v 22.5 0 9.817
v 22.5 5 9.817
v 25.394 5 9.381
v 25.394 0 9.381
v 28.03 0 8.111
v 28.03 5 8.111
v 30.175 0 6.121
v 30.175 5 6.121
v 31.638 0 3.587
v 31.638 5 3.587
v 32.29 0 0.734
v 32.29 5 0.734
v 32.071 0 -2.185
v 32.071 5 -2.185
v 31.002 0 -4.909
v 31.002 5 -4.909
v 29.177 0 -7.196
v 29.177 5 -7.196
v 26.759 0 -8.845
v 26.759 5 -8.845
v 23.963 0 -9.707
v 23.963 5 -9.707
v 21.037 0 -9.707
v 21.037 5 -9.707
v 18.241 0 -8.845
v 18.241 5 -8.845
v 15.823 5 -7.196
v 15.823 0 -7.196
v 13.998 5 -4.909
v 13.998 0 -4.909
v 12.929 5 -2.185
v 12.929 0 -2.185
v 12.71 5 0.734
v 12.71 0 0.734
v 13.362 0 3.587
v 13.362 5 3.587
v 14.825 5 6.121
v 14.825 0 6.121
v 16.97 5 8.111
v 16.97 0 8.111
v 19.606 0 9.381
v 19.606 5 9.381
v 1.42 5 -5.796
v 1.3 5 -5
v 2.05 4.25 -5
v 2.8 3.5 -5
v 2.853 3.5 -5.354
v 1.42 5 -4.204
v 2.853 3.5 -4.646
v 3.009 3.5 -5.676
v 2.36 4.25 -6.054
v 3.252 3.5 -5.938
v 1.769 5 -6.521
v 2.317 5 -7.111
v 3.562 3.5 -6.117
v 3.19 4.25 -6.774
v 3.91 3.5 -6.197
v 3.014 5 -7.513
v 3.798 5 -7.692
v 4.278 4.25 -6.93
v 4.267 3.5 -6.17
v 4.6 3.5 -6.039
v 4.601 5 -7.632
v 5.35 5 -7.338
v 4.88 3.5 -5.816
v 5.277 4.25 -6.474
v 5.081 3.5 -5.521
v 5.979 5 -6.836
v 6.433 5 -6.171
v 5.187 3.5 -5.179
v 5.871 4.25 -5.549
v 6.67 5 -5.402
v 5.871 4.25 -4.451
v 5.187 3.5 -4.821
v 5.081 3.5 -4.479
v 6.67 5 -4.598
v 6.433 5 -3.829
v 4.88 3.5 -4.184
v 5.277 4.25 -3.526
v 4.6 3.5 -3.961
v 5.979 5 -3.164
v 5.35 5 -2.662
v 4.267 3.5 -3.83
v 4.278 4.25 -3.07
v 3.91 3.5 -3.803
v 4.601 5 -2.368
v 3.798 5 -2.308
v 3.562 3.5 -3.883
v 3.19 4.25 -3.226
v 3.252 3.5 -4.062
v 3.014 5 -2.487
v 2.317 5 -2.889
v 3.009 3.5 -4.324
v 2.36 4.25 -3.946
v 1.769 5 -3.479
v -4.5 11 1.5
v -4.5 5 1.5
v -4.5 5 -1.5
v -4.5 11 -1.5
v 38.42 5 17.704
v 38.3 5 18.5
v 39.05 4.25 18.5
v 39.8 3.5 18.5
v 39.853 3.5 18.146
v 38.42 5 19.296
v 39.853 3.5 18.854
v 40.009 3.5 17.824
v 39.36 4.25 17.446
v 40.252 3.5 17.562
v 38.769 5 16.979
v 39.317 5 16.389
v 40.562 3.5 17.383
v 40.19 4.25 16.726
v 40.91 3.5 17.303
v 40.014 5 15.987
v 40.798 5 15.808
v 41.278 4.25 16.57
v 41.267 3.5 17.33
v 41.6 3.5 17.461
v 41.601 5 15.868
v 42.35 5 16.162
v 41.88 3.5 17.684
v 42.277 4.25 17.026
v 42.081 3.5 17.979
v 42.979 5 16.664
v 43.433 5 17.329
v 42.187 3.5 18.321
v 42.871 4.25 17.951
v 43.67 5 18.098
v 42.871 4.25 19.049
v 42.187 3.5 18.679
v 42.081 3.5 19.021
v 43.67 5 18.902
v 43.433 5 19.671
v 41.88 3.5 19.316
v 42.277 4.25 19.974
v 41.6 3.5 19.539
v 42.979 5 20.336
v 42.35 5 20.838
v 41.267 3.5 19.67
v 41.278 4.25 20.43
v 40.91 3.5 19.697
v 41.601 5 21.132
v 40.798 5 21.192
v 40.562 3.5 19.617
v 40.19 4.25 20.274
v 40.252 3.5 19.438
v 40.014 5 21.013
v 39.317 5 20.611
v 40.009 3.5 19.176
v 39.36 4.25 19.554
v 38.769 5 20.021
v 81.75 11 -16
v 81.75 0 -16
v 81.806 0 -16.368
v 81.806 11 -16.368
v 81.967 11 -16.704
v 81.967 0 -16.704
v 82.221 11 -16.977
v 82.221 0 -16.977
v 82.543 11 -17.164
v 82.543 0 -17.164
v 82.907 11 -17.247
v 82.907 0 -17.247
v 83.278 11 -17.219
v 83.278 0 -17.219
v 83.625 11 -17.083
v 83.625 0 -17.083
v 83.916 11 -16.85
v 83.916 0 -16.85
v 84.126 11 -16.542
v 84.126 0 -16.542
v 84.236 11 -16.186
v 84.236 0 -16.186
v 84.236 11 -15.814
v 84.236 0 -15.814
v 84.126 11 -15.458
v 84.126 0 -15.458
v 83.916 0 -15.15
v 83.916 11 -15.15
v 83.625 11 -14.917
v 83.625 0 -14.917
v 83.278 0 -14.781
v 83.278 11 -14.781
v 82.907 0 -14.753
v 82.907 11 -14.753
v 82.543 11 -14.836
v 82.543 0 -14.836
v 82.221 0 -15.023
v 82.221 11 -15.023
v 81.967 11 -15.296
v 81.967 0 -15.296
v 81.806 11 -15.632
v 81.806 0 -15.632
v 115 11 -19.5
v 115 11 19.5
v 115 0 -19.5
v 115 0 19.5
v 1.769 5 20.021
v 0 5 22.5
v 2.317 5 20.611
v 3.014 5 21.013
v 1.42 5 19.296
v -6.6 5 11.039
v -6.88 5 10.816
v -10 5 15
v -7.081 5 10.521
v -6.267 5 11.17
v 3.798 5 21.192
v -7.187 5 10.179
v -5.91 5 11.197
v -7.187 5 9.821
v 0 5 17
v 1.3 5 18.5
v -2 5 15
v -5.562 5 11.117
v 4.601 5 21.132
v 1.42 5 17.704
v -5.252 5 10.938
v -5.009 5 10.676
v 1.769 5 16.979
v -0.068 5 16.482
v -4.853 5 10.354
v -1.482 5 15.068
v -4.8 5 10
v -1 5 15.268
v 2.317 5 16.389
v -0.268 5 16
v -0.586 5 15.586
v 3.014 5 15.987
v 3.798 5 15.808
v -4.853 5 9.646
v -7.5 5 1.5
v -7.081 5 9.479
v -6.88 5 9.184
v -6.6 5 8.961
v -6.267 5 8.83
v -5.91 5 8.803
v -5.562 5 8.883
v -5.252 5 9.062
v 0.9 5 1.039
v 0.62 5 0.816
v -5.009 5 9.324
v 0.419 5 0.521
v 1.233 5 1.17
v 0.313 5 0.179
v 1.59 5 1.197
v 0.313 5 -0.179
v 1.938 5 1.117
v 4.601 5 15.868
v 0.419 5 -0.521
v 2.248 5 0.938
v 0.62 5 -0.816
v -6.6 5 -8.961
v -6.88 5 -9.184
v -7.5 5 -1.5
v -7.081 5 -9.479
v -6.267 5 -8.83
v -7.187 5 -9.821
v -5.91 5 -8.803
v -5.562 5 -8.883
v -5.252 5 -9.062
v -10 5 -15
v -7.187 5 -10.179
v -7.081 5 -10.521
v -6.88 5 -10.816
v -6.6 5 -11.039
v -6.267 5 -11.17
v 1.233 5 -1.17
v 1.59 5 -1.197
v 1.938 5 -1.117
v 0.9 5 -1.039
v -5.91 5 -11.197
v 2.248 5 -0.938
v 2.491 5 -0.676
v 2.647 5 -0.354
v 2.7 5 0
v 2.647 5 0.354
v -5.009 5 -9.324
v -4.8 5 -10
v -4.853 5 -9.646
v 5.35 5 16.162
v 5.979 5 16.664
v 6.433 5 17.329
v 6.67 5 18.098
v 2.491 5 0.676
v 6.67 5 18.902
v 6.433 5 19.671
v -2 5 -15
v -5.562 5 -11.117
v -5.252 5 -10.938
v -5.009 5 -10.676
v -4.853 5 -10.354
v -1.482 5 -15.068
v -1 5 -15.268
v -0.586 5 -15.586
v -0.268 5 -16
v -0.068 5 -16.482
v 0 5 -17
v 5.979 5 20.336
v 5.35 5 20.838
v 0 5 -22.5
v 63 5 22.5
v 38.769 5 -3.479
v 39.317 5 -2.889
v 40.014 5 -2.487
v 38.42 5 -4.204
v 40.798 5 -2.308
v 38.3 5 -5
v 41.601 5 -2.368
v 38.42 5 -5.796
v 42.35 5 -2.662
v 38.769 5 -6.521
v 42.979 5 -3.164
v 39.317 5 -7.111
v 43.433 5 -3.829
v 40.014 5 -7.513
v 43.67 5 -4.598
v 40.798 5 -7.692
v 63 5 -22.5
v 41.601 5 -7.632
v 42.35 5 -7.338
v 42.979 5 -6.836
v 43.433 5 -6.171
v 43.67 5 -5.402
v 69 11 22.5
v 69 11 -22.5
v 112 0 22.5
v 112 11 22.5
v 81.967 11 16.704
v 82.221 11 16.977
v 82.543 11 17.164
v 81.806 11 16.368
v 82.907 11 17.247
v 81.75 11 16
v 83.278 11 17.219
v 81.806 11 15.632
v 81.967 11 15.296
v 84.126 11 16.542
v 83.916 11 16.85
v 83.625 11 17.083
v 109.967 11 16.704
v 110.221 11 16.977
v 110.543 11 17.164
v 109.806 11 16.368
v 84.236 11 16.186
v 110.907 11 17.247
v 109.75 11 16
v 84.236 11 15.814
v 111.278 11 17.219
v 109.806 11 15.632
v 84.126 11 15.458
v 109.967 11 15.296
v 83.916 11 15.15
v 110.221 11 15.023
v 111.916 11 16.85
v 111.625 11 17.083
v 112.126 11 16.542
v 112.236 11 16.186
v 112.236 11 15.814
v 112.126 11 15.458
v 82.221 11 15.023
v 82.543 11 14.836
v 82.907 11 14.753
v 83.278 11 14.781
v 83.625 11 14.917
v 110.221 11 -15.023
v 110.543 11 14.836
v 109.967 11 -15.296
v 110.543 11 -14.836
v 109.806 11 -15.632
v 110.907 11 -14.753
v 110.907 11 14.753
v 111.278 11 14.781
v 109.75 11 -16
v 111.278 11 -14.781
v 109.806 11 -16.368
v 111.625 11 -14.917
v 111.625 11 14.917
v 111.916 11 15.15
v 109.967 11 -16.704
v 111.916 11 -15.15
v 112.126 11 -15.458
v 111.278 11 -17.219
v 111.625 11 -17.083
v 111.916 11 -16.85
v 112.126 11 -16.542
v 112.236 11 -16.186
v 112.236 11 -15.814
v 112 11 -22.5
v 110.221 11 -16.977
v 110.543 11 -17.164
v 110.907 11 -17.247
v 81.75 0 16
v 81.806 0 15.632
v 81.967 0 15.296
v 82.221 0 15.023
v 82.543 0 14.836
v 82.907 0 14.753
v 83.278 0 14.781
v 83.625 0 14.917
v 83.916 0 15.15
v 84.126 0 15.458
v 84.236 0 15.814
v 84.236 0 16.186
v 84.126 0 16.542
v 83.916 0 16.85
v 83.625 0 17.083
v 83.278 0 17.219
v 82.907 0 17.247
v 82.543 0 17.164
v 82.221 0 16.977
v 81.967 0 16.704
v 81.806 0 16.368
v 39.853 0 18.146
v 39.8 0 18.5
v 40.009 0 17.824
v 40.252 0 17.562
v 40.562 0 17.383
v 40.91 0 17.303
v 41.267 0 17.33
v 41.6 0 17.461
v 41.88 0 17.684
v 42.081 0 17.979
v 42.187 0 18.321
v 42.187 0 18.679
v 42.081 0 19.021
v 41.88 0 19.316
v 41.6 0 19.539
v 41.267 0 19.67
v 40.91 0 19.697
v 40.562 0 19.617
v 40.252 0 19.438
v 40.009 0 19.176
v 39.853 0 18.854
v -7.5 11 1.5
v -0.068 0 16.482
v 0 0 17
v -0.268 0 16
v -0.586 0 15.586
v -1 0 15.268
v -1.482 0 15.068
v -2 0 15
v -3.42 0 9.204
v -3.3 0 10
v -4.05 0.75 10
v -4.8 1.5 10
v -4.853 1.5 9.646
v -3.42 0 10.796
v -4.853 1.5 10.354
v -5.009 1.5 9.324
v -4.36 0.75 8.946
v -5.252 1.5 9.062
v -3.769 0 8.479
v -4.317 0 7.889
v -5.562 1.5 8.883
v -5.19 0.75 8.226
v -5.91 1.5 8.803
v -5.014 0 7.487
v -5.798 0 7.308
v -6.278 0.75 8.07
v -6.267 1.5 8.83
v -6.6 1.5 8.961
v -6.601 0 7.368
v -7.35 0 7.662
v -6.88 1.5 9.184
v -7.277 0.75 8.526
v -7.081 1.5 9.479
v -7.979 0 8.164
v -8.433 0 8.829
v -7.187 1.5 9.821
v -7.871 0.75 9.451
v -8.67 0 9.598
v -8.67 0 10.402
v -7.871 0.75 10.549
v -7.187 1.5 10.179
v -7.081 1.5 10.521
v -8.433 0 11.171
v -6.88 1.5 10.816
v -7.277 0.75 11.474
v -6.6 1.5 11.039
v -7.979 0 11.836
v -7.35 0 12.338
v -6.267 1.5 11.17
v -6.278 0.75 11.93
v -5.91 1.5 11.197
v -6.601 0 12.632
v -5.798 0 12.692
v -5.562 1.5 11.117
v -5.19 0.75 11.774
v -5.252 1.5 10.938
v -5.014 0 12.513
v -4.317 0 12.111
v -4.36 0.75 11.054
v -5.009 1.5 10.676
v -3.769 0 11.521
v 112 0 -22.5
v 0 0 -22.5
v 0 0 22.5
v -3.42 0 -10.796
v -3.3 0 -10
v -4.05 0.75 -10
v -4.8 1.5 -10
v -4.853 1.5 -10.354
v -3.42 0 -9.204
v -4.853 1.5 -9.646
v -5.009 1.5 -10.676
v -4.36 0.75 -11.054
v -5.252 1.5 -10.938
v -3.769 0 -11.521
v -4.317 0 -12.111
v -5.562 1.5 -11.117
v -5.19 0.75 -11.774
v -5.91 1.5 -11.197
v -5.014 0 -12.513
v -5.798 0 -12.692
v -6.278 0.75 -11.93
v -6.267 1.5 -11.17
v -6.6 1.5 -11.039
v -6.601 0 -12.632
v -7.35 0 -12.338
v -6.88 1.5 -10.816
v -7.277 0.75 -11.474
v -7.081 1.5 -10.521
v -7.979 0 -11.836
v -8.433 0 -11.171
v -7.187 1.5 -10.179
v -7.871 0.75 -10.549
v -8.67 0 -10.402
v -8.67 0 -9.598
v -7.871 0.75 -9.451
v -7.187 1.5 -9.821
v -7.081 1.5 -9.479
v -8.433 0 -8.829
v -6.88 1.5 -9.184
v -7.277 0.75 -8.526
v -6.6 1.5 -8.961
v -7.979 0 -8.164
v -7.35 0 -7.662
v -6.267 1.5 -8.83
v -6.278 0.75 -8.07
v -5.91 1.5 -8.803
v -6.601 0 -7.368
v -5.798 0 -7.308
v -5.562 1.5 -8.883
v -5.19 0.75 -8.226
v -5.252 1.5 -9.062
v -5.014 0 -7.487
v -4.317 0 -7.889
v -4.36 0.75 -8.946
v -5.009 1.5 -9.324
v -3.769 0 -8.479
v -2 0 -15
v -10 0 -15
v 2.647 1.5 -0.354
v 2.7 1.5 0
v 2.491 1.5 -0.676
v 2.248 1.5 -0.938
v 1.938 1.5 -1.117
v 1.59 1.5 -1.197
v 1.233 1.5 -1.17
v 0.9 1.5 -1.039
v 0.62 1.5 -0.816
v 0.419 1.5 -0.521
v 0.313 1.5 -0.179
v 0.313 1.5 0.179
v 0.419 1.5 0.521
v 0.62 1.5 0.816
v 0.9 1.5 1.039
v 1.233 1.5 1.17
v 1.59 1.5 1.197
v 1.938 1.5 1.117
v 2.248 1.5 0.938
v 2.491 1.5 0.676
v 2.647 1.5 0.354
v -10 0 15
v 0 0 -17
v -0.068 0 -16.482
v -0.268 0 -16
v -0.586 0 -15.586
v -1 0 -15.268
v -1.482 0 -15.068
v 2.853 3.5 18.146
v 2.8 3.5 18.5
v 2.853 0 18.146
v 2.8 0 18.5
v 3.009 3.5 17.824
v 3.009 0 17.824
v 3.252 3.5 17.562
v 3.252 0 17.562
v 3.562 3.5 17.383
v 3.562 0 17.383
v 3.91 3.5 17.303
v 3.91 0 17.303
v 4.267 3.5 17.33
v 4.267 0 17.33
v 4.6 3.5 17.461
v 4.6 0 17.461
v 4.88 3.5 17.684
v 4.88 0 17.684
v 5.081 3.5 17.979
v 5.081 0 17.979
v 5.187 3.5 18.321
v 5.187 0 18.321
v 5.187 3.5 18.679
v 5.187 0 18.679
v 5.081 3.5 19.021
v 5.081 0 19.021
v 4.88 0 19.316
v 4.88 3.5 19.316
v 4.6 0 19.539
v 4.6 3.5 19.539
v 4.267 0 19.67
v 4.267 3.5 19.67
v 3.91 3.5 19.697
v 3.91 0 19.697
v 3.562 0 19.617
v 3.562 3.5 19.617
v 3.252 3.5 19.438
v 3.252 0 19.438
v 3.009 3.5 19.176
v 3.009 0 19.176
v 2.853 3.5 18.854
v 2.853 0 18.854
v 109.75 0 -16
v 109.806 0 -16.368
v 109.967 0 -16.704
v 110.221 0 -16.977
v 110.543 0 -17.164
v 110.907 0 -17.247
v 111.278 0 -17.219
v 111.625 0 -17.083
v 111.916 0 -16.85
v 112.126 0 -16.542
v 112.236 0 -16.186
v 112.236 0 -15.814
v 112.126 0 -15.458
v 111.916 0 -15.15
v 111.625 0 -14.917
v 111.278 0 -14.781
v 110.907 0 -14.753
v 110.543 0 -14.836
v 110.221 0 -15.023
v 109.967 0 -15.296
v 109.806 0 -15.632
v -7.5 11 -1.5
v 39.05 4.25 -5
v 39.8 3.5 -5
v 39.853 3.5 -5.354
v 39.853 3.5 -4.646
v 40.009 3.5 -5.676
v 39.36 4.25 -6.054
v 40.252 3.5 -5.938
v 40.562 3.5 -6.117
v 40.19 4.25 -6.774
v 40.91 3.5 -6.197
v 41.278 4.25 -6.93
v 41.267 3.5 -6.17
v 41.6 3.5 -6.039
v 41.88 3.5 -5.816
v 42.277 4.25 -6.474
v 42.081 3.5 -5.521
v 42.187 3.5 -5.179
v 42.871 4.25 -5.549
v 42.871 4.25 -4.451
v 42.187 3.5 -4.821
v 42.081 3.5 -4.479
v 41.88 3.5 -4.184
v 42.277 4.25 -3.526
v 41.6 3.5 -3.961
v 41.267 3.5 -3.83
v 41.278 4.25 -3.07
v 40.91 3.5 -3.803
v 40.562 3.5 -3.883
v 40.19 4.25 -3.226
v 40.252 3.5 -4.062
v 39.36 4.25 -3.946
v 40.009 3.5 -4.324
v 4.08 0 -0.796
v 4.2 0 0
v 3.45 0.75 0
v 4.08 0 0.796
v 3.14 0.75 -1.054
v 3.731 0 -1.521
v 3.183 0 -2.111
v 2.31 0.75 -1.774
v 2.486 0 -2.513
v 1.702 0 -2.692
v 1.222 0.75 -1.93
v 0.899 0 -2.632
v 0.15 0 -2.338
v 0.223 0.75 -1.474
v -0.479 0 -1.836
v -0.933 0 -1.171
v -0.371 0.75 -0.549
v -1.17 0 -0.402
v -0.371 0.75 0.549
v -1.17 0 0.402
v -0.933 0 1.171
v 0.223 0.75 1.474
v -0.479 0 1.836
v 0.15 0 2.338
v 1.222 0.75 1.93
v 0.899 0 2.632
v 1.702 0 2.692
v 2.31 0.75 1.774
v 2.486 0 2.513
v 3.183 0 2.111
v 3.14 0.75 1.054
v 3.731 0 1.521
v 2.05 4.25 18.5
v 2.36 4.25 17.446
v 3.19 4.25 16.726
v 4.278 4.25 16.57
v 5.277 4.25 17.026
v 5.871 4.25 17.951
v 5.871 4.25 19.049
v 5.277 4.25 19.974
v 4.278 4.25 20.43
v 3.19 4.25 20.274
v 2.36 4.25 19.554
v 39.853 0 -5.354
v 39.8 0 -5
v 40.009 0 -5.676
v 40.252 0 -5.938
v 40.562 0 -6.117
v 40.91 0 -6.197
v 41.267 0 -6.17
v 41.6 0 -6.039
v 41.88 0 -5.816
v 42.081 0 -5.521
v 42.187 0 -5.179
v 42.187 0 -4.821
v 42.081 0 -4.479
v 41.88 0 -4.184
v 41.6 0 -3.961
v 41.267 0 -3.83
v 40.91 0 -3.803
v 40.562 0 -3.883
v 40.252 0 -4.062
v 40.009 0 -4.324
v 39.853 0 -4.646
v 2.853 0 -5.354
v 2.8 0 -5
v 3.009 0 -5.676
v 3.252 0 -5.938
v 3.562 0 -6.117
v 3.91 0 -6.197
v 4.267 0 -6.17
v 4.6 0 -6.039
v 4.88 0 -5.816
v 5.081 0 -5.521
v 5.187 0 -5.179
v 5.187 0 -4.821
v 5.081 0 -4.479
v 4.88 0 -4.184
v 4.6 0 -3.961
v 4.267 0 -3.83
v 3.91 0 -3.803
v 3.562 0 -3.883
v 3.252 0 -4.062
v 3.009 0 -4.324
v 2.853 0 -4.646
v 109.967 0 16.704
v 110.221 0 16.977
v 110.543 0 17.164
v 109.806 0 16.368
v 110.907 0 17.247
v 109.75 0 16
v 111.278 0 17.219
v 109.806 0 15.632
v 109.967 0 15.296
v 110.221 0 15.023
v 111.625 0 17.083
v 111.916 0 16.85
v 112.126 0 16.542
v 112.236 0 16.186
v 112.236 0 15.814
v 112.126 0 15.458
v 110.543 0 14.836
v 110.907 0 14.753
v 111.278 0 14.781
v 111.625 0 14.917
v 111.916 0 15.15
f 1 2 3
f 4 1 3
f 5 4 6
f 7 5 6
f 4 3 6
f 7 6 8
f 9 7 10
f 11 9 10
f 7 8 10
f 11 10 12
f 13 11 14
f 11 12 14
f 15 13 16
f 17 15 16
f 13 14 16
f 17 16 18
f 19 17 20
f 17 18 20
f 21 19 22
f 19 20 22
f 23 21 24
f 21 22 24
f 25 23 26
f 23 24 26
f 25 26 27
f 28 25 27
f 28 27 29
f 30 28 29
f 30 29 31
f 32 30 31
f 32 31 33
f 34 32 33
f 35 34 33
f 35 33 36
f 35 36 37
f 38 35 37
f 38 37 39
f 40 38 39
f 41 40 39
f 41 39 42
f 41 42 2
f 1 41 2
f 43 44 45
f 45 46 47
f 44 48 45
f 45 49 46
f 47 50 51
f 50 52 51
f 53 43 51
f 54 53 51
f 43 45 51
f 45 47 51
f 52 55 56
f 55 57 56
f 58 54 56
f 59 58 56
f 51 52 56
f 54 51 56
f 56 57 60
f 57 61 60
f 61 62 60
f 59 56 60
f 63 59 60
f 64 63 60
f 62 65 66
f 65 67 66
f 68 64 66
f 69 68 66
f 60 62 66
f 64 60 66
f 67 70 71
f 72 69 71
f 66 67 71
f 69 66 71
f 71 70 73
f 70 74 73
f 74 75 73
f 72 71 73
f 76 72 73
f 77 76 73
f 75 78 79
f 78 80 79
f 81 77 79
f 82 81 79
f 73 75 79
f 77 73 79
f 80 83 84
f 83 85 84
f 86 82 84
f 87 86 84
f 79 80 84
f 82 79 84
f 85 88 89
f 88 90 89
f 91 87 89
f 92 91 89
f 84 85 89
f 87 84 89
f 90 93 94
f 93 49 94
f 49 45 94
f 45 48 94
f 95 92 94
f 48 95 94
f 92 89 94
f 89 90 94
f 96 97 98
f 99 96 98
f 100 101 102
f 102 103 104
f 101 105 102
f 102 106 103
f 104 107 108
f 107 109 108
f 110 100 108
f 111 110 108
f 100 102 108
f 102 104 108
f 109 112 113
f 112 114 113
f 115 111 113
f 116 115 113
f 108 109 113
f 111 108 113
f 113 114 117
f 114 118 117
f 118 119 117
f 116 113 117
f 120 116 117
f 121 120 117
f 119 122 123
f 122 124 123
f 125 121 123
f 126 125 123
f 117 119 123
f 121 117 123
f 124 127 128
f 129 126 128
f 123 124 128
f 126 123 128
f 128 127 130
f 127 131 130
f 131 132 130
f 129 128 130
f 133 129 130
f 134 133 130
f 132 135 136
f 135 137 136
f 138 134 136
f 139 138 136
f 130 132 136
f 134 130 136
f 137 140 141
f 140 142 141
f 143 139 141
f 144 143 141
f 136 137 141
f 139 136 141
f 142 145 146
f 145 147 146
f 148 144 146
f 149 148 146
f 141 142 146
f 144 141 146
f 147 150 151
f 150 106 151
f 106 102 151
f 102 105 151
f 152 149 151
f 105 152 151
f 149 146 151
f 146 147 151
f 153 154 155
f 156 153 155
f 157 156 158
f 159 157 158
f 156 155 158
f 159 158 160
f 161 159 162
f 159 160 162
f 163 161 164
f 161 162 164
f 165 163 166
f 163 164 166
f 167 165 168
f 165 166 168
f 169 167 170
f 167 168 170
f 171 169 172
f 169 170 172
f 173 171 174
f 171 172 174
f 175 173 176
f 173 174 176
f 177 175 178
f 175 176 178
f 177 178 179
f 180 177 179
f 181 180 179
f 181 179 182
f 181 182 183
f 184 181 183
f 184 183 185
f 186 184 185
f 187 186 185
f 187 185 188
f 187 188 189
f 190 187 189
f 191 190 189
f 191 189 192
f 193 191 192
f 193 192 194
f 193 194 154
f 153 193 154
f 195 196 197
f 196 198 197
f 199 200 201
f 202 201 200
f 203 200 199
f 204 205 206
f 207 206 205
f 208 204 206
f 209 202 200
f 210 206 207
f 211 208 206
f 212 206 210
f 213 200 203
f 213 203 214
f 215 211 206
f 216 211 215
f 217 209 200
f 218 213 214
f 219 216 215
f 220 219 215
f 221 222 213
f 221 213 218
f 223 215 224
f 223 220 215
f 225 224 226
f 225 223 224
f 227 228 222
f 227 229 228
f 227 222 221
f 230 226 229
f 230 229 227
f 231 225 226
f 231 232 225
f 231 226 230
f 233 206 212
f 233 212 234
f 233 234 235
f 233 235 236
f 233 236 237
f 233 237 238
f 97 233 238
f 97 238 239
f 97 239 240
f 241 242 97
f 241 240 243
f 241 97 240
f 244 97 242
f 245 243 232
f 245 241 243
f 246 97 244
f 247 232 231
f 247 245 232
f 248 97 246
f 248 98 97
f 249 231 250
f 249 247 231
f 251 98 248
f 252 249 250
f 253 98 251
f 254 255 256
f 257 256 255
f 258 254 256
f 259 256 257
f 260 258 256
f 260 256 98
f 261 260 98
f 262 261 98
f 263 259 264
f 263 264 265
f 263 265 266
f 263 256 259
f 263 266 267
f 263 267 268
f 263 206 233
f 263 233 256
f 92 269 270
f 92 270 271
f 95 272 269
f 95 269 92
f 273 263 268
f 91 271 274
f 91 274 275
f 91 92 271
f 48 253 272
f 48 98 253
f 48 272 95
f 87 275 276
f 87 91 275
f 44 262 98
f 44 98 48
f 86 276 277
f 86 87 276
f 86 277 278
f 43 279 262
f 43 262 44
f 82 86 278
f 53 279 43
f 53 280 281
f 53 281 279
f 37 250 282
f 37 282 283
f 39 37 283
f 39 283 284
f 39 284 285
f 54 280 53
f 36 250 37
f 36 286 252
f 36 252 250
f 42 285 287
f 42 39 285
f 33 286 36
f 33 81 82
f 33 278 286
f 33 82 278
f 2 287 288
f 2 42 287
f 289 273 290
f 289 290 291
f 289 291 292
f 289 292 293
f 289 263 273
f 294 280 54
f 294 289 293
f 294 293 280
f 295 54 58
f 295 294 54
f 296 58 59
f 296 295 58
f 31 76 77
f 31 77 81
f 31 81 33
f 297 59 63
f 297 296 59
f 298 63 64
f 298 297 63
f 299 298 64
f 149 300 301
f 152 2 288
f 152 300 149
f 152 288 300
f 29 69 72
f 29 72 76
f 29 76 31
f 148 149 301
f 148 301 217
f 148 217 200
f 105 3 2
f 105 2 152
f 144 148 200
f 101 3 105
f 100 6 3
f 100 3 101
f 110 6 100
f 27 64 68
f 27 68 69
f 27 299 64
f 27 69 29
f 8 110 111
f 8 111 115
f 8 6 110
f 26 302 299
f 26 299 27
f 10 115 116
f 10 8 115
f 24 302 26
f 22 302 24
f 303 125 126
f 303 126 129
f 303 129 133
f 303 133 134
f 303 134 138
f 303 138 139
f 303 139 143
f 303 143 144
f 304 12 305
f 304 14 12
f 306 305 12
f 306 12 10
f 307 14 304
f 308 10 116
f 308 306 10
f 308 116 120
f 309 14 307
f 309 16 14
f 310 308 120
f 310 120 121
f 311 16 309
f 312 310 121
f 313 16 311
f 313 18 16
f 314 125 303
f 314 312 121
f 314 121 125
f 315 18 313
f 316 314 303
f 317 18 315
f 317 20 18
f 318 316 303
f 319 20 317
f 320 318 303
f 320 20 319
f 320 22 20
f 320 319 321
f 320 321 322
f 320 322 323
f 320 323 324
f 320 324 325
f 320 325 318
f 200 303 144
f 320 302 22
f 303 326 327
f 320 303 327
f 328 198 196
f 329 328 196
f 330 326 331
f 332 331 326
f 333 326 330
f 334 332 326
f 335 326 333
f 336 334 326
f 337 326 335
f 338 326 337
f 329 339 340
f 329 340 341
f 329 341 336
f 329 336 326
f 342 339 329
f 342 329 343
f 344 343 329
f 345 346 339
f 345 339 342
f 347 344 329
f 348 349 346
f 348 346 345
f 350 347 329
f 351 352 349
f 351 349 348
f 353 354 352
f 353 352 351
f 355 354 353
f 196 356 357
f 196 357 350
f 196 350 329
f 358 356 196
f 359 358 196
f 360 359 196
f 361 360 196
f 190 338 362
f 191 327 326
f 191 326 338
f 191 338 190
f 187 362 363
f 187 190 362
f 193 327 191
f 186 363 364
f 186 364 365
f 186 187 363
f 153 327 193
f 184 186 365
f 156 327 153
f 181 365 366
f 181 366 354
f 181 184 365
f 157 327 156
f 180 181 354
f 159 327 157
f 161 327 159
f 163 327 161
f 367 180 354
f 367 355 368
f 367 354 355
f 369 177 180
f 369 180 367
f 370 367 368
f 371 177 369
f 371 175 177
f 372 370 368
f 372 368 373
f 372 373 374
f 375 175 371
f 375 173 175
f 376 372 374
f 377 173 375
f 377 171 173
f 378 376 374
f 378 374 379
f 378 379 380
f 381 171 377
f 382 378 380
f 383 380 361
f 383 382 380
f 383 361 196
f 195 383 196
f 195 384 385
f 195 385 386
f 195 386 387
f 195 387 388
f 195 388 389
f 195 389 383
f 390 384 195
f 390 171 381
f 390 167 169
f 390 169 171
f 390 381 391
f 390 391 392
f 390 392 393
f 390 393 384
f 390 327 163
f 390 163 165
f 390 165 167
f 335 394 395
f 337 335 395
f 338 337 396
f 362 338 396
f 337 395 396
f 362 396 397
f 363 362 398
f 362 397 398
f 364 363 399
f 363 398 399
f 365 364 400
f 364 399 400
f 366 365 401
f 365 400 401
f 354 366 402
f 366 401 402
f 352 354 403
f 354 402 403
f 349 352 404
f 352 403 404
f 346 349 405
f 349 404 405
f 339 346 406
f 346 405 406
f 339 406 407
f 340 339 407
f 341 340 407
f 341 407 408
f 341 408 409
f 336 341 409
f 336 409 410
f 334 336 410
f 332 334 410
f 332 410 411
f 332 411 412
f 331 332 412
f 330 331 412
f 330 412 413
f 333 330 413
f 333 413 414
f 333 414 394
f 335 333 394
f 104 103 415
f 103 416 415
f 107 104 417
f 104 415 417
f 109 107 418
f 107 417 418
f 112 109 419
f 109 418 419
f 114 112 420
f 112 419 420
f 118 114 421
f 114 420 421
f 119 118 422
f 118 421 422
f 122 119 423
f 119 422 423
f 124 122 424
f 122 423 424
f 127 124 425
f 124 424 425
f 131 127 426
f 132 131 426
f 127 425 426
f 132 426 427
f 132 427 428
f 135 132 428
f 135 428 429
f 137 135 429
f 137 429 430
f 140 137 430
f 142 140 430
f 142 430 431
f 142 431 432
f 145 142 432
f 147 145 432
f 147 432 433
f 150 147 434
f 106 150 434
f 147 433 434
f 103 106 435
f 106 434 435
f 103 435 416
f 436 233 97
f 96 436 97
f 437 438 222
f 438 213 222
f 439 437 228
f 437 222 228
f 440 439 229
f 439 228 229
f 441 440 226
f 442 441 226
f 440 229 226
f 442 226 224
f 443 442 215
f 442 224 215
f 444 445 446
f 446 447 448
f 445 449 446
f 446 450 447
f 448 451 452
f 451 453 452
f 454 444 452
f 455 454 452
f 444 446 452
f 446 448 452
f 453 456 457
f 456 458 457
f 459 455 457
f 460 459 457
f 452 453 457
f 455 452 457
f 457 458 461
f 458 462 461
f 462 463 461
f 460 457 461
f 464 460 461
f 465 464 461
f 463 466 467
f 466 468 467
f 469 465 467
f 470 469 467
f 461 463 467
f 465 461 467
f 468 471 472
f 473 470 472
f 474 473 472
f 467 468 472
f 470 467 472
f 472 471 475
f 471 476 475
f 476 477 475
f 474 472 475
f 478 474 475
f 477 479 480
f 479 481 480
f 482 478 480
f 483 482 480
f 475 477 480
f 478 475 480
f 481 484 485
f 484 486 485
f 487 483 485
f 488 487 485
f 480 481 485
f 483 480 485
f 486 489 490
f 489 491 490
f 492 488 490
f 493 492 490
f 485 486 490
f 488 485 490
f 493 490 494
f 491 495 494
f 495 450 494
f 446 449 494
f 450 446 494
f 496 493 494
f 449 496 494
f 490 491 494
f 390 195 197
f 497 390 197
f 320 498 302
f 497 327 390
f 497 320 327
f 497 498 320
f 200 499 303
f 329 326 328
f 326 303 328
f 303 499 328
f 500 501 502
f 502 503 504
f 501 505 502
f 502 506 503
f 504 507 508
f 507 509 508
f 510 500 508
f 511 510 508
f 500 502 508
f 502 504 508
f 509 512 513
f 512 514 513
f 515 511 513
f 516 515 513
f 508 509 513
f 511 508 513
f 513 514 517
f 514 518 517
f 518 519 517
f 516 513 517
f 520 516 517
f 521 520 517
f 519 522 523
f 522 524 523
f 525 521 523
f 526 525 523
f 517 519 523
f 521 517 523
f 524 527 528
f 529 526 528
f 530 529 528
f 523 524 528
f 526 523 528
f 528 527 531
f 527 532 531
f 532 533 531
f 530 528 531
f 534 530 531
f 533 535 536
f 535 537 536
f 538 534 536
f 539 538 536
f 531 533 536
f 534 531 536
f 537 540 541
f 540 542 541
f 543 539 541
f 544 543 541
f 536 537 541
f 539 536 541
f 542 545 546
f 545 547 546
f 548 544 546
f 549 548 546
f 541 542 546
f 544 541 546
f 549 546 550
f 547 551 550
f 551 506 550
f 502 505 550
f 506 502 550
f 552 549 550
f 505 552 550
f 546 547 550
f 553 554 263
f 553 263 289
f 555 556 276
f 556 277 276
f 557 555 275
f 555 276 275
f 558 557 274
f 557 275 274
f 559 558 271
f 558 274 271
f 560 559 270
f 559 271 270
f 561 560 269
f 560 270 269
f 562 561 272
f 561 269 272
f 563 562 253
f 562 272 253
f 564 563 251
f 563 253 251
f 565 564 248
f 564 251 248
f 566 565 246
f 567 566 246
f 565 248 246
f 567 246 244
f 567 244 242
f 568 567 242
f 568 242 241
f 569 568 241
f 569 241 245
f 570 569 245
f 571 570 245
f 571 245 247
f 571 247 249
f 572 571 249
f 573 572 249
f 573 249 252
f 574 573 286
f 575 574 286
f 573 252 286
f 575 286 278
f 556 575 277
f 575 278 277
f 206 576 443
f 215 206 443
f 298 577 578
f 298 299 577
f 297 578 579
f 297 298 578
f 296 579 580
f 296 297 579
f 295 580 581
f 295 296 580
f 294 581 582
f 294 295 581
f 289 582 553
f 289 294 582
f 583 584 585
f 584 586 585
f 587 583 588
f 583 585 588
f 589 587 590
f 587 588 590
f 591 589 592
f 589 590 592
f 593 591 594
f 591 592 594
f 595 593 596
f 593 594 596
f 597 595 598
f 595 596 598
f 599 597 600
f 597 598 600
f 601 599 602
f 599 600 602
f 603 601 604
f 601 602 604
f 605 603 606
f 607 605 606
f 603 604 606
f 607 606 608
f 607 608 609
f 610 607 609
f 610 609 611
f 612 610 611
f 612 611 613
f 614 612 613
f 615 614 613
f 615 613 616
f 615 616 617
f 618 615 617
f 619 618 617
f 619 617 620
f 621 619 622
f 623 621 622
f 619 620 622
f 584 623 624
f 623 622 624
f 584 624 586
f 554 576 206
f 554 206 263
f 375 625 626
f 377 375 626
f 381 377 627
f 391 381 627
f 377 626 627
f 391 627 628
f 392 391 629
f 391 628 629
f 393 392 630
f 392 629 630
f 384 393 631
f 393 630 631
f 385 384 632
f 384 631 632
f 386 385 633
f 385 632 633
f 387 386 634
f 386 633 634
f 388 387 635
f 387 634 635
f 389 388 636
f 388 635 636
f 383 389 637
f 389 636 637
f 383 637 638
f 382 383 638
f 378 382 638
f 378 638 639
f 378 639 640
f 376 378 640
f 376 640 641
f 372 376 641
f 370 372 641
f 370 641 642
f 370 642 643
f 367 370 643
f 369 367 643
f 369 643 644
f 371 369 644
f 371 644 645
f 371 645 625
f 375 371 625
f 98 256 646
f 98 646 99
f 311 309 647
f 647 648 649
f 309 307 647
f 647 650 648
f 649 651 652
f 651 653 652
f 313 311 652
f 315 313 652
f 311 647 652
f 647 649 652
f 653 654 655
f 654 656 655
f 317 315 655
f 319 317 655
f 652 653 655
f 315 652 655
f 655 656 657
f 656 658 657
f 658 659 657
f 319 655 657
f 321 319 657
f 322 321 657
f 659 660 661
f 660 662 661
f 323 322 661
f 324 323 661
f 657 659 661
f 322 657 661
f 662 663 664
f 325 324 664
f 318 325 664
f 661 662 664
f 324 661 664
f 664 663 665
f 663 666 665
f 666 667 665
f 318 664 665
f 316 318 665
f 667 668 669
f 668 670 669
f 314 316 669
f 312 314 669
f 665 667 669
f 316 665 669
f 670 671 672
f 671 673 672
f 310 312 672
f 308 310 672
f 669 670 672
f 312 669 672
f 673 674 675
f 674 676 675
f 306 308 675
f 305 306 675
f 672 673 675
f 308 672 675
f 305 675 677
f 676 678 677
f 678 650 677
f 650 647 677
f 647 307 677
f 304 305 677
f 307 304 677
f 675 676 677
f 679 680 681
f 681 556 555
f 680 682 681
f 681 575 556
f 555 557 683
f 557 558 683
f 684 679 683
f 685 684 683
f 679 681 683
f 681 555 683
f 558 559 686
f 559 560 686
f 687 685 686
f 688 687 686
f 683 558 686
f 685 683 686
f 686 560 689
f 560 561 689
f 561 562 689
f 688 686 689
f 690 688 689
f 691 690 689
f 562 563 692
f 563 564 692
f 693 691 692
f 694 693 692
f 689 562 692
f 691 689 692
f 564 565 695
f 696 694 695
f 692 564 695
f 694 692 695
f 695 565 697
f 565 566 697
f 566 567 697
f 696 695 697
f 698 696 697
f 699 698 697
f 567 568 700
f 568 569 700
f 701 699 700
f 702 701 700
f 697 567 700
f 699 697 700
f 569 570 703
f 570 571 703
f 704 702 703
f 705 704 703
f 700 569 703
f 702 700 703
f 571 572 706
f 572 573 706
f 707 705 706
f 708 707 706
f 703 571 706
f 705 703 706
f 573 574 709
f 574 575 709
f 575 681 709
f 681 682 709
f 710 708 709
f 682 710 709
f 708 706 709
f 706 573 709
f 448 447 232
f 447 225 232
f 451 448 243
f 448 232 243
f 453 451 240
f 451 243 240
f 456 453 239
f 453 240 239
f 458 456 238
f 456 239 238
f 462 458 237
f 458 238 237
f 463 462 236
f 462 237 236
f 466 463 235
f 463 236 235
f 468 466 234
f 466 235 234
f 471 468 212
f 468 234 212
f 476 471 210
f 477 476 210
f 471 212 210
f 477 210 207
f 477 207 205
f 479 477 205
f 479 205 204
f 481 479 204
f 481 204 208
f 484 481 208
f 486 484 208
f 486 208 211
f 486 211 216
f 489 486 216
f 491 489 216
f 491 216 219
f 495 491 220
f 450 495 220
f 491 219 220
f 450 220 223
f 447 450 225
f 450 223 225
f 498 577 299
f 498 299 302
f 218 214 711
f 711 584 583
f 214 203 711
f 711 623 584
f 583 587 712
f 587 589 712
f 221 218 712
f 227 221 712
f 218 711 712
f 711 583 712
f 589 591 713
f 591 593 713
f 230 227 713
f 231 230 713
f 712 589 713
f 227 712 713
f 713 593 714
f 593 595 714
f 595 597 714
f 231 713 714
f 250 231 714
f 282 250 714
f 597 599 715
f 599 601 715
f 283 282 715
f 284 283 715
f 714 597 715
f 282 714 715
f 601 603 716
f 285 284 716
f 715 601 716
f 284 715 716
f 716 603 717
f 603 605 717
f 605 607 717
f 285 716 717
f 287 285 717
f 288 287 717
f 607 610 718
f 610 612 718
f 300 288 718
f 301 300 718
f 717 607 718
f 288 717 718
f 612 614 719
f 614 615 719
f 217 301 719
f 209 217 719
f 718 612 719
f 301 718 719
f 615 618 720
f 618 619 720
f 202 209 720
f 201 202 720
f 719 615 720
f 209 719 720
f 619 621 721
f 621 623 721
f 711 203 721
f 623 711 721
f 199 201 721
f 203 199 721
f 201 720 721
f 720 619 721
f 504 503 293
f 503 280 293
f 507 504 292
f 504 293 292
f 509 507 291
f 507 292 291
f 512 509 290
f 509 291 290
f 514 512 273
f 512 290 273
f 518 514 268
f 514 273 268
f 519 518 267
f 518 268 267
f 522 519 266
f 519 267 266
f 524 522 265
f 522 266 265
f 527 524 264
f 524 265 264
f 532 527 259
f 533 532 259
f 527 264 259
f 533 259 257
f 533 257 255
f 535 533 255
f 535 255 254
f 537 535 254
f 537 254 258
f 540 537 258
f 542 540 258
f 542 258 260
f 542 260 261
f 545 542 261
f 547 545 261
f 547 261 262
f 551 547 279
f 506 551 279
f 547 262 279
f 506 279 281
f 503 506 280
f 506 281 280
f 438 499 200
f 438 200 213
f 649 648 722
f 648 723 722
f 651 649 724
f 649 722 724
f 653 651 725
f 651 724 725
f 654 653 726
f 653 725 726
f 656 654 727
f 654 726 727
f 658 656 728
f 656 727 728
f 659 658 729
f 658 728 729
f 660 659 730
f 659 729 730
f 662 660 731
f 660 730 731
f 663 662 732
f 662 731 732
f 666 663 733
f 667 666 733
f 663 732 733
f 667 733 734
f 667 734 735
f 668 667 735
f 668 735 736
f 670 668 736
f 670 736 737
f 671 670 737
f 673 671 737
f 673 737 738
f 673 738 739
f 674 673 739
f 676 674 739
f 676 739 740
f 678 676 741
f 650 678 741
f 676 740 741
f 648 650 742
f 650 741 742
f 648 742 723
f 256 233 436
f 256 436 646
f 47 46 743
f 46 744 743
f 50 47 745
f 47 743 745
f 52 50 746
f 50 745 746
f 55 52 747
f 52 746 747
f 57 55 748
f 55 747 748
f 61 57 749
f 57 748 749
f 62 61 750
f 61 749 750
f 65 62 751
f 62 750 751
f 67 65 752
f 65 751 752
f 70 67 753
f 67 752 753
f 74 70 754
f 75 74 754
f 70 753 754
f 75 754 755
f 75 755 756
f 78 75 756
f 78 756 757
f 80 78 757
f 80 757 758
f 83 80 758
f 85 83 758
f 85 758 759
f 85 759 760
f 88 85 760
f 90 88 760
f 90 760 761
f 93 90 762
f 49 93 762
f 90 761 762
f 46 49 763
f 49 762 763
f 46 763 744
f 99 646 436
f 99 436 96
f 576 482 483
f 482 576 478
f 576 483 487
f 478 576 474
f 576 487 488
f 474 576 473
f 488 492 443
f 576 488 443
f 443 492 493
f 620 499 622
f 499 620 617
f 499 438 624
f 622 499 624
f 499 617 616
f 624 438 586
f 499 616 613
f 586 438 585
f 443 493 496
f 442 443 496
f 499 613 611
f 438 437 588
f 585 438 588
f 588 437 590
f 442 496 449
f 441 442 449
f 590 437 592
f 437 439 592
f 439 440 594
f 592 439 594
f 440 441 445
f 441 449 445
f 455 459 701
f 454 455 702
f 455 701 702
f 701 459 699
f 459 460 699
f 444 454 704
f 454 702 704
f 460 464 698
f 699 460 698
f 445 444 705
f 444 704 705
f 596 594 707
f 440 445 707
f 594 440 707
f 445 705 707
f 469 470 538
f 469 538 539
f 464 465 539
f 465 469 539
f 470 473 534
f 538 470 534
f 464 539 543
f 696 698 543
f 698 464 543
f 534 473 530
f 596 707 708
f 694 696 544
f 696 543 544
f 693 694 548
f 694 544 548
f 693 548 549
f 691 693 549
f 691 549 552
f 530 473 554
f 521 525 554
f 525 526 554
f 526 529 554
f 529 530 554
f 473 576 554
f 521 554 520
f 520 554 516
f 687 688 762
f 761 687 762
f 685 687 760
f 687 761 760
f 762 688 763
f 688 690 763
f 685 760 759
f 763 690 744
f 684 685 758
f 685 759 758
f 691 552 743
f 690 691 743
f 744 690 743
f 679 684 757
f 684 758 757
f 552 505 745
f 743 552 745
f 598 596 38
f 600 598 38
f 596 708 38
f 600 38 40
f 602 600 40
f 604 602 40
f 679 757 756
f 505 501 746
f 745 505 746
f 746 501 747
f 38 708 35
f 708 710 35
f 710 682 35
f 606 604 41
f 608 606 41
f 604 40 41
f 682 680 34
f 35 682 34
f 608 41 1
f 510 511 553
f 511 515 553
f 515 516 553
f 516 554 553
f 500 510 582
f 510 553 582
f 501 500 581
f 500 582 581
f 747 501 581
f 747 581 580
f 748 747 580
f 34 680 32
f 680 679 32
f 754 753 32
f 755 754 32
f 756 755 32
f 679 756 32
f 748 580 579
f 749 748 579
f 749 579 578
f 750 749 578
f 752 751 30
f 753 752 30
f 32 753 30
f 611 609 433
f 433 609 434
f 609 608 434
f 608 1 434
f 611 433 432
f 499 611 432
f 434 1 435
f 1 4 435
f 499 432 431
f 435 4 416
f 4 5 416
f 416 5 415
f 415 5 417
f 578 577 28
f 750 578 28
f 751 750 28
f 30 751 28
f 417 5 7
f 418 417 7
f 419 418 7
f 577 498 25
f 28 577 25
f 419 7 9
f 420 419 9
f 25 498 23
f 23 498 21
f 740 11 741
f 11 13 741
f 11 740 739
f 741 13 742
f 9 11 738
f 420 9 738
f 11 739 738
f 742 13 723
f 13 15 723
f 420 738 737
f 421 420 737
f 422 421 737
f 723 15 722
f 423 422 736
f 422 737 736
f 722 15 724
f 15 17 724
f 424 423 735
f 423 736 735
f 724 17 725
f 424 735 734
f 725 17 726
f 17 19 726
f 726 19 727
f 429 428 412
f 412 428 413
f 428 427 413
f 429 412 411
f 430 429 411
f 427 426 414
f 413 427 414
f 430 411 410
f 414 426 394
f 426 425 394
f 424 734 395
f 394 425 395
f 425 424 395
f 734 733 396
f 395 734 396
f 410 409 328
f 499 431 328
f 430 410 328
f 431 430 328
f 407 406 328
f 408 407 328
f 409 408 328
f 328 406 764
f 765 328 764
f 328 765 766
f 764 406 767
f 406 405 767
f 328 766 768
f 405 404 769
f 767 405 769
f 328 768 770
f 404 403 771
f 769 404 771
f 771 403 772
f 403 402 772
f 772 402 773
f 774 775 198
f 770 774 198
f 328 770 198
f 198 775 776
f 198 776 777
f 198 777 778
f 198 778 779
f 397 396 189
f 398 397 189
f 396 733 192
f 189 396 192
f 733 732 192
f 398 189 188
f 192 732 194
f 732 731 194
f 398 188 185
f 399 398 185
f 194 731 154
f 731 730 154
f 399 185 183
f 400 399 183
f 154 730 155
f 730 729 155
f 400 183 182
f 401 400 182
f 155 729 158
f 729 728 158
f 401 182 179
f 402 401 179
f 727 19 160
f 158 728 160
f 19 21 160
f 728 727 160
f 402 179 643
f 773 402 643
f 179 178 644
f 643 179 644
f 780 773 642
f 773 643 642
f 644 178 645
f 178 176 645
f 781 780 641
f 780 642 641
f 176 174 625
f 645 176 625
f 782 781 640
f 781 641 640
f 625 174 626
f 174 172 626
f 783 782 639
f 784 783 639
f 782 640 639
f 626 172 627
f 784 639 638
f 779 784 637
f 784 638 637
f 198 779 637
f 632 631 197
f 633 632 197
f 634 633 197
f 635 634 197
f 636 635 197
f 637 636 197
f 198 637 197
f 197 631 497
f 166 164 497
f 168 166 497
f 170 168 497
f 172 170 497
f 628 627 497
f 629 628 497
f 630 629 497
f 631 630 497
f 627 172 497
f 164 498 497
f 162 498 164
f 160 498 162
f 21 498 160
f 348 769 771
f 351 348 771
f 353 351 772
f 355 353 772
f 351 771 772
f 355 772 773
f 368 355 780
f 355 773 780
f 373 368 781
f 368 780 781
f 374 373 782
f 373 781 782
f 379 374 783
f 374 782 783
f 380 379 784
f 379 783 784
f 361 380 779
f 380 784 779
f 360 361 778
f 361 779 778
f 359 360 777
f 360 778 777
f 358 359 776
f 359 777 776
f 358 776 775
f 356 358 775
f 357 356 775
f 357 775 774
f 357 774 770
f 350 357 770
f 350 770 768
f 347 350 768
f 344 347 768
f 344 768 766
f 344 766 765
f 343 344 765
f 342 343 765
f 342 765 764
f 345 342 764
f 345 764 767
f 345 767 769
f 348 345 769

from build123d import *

# Parameters (mm, degrees)
SKETCH1_W                                           = 115
SKETCH1_H                                           = 45
BOSS_EXTRUDE1_DEPTH                                 = 5
CUT_EXTRUDE1_REACH                                  = 119.287
SKETCH2_R                                           = 9.8171
CSK_FOR_M2_COUNTERSUNK_FLAT_HEAD_SCREW1_D           = 2.4
CSK_FOR_M2_COUNTERSUNK_FLAT_HEAD_SCREW1_CSINK_D     = 5.4
CSK_FOR_M2_COUNTERSUNK_FLAT_HEAD_SCREW1_CSINK_ANGLE = 90
SKETCH13_W                                          = 52
SKETCH13_H                                          = 45
BOSS_EXTRUDE4_DEPTH                                 = 6
CHAMFER2_SIZE                                       = 6
M3_TAPPED_HOLE1_D                                   = 2.5
CHAMFER1_SIZE                                       = 3
SKETCH14_W                                          = 10
SKETCH14_H                                          = 30
BOSS_EXTRUDE5_DEPTH                                 = 5
FILLET1_R                                           = 2
CSK_FOR_M2_COUNTERSUNK_FLAT_HEAD_SCREW2_D           = 2.4
CSK_FOR_M2_COUNTERSUNK_FLAT_HEAD_SCREW2_DEPTH       = 5
CSK_FOR_M2_COUNTERSUNK_FLAT_HEAD_SCREW2_CSINK_D     = 5.4
CSK_FOR_M2_COUNTERSUNK_FLAT_HEAD_SCREW2_CSINK_ANGLE = 90
CSK_FOR_M2_COUNTERSUNK_FLAT_HEAD_SCREW2_TIP         = 0.721032743
SKETCH17_W                                          = 3
SKETCH17_H                                          = 3
BOSS_EXTRUDE6_DEPTH                                 = 6


with BuildPart() as part:
    # Sketch1 → Boss-Extrude1 (new body)
    with BuildSketch(Plane(origin=(0, 0, 0), x_dir=(1, 0, 0), z_dir=(0, 1, 0))):
        with Locations((57.5, 0)):
            Rectangle(SKETCH1_W, SKETCH1_H)
    extrude(amount=BOSS_EXTRUDE1_DEPTH)

    # Sketch2 → Cut-Extrude1 (cut, up to next)
    with BuildSketch(Plane(origin=(0, 5, 0), x_dir=(1, 0, 0), z_dir=(0, 1, 0)), mode=Mode.PRIVATE) as cut_extrude1_sk1:
        with Locations(Location((22.5, 0, 0), (0, 0, 270))):
            Circle(SKETCH2_R)
    cut_extrude1_tool1 = extrude(cut_extrude1_sk1.sketch, amount=-CUT_EXTRUDE1_REACH, mode=Mode.PRIVATE) & part.part
    add(cut_extrude1_tool1.solids().sort_by_distance((22.5, 5, 0))[0], mode=Mode.SUBTRACT)

    # CSK for M2 Countersunk Flat Head Screw1 (through all)
    with Locations(Plane(origin=(0, 5, 0), x_dir=(1, 0, 0), z_dir=(0, 1, 0))):
        with Locations((4, -18.5), (41, -18.5), (41, 5), (4, 5)):
            CounterSinkHole(CSK_FOR_M2_COUNTERSUNK_FLAT_HEAD_SCREW1_D / 2, CSK_FOR_M2_COUNTERSUNK_FLAT_HEAD_SCREW1_CSINK_D / 2, counter_sink_angle=CSK_FOR_M2_COUNTERSUNK_FLAT_HEAD_SCREW1_CSINK_ANGLE)

    # Sketch13 → Boss-Extrude4 (add)
    with BuildSketch(Plane(origin=(0, 5, 0), x_dir=(1, 0, 0), z_dir=(0, 1, 0))):
        with Locations((89, 0)):
            Rectangle(SKETCH13_W, SKETCH13_H)
    extrude(amount=BOSS_EXTRUDE4_DEPTH)

    # Chamfer2
    chamfer2_edges = [part.edges().sort_by_distance(p)[0] for p in [
        (63, 11, 0),
    ]]
    chamfer(chamfer2_edges, length=CHAMFER2_SIZE - 0.0001)  # a hair under: the kernel refuses the full size

    # M3 Tapped Hole1 (through all)
    with Locations(Plane(origin=(0, 11, 0), x_dir=(1, 0, 0), z_dir=(0, 1, 0))):
        with Locations((83, 16), (111, 16), (83, -16), (111, -16)):
            Hole(M3_TAPPED_HOLE1_D / 2)

    # Chamfer1
    chamfer1_edges = [part.edges().sort_by_distance(p)[0] for p in [
        (115, 5.5, -22.5),
        (115, 5.5, 22.5),
    ]]
    chamfer(chamfer1_edges, length=CHAMFER1_SIZE)

    # Sketch14 → Boss-Extrude5 (add)
    with BuildSketch(Plane(origin=(0, 0, 0), x_dir=(1, 0, 0), z_dir=(0, 1, 0))):
        with Locations((-5, 0)):
            Rectangle(SKETCH14_W, SKETCH14_H)
    extrude(amount=BOSS_EXTRUDE5_DEPTH)

    # Fillet1
    fillet1_edges = [part.edges().sort_by_distance(p)[0] for p in [
        (0, 2.5, -15),
        (0, 2.5, 15),
    ]]
    fillet(fillet1_edges, radius=FILLET1_R)

    # CSK for M2 Countersunk Flat Head Screw2
    with Locations(Plane(origin=(0, 0, 0), x_dir=(-1, 0, 0), z_dir=(0, -1, 0))):
        with Locations((-1.5, 0), (6, -10), (6, 10)):
            CounterSinkHole(CSK_FOR_M2_COUNTERSUNK_FLAT_HEAD_SCREW2_D / 2, CSK_FOR_M2_COUNTERSUNK_FLAT_HEAD_SCREW2_CSINK_D / 2, depth=CSK_FOR_M2_COUNTERSUNK_FLAT_HEAD_SCREW2_DEPTH, counter_sink_angle=CSK_FOR_M2_COUNTERSUNK_FLAT_HEAD_SCREW2_CSINK_ANGLE)
            with Locations((0, 0, -(CSK_FOR_M2_COUNTERSUNK_FLAT_HEAD_SCREW2_DEPTH + CSK_FOR_M2_COUNTERSUNK_FLAT_HEAD_SCREW2_TIP / 2))):  # 118° drill point
                Cone(0, CSK_FOR_M2_COUNTERSUNK_FLAT_HEAD_SCREW2_D / 2, CSK_FOR_M2_COUNTERSUNK_FLAT_HEAD_SCREW2_TIP, mode=Mode.SUBTRACT)

    # Sketch17 → Boss-Extrude6 (add)
    with BuildSketch(Plane(origin=(0, 5, 0), x_dir=(1, 0, 0), z_dir=(0, 1, 0))):
        with Locations((-6, 0)):
            Rectangle(SKETCH17_W, SKETCH17_H)
    extrude(amount=BOSS_EXTRUDE6_DEPTH)


solid = part.part
